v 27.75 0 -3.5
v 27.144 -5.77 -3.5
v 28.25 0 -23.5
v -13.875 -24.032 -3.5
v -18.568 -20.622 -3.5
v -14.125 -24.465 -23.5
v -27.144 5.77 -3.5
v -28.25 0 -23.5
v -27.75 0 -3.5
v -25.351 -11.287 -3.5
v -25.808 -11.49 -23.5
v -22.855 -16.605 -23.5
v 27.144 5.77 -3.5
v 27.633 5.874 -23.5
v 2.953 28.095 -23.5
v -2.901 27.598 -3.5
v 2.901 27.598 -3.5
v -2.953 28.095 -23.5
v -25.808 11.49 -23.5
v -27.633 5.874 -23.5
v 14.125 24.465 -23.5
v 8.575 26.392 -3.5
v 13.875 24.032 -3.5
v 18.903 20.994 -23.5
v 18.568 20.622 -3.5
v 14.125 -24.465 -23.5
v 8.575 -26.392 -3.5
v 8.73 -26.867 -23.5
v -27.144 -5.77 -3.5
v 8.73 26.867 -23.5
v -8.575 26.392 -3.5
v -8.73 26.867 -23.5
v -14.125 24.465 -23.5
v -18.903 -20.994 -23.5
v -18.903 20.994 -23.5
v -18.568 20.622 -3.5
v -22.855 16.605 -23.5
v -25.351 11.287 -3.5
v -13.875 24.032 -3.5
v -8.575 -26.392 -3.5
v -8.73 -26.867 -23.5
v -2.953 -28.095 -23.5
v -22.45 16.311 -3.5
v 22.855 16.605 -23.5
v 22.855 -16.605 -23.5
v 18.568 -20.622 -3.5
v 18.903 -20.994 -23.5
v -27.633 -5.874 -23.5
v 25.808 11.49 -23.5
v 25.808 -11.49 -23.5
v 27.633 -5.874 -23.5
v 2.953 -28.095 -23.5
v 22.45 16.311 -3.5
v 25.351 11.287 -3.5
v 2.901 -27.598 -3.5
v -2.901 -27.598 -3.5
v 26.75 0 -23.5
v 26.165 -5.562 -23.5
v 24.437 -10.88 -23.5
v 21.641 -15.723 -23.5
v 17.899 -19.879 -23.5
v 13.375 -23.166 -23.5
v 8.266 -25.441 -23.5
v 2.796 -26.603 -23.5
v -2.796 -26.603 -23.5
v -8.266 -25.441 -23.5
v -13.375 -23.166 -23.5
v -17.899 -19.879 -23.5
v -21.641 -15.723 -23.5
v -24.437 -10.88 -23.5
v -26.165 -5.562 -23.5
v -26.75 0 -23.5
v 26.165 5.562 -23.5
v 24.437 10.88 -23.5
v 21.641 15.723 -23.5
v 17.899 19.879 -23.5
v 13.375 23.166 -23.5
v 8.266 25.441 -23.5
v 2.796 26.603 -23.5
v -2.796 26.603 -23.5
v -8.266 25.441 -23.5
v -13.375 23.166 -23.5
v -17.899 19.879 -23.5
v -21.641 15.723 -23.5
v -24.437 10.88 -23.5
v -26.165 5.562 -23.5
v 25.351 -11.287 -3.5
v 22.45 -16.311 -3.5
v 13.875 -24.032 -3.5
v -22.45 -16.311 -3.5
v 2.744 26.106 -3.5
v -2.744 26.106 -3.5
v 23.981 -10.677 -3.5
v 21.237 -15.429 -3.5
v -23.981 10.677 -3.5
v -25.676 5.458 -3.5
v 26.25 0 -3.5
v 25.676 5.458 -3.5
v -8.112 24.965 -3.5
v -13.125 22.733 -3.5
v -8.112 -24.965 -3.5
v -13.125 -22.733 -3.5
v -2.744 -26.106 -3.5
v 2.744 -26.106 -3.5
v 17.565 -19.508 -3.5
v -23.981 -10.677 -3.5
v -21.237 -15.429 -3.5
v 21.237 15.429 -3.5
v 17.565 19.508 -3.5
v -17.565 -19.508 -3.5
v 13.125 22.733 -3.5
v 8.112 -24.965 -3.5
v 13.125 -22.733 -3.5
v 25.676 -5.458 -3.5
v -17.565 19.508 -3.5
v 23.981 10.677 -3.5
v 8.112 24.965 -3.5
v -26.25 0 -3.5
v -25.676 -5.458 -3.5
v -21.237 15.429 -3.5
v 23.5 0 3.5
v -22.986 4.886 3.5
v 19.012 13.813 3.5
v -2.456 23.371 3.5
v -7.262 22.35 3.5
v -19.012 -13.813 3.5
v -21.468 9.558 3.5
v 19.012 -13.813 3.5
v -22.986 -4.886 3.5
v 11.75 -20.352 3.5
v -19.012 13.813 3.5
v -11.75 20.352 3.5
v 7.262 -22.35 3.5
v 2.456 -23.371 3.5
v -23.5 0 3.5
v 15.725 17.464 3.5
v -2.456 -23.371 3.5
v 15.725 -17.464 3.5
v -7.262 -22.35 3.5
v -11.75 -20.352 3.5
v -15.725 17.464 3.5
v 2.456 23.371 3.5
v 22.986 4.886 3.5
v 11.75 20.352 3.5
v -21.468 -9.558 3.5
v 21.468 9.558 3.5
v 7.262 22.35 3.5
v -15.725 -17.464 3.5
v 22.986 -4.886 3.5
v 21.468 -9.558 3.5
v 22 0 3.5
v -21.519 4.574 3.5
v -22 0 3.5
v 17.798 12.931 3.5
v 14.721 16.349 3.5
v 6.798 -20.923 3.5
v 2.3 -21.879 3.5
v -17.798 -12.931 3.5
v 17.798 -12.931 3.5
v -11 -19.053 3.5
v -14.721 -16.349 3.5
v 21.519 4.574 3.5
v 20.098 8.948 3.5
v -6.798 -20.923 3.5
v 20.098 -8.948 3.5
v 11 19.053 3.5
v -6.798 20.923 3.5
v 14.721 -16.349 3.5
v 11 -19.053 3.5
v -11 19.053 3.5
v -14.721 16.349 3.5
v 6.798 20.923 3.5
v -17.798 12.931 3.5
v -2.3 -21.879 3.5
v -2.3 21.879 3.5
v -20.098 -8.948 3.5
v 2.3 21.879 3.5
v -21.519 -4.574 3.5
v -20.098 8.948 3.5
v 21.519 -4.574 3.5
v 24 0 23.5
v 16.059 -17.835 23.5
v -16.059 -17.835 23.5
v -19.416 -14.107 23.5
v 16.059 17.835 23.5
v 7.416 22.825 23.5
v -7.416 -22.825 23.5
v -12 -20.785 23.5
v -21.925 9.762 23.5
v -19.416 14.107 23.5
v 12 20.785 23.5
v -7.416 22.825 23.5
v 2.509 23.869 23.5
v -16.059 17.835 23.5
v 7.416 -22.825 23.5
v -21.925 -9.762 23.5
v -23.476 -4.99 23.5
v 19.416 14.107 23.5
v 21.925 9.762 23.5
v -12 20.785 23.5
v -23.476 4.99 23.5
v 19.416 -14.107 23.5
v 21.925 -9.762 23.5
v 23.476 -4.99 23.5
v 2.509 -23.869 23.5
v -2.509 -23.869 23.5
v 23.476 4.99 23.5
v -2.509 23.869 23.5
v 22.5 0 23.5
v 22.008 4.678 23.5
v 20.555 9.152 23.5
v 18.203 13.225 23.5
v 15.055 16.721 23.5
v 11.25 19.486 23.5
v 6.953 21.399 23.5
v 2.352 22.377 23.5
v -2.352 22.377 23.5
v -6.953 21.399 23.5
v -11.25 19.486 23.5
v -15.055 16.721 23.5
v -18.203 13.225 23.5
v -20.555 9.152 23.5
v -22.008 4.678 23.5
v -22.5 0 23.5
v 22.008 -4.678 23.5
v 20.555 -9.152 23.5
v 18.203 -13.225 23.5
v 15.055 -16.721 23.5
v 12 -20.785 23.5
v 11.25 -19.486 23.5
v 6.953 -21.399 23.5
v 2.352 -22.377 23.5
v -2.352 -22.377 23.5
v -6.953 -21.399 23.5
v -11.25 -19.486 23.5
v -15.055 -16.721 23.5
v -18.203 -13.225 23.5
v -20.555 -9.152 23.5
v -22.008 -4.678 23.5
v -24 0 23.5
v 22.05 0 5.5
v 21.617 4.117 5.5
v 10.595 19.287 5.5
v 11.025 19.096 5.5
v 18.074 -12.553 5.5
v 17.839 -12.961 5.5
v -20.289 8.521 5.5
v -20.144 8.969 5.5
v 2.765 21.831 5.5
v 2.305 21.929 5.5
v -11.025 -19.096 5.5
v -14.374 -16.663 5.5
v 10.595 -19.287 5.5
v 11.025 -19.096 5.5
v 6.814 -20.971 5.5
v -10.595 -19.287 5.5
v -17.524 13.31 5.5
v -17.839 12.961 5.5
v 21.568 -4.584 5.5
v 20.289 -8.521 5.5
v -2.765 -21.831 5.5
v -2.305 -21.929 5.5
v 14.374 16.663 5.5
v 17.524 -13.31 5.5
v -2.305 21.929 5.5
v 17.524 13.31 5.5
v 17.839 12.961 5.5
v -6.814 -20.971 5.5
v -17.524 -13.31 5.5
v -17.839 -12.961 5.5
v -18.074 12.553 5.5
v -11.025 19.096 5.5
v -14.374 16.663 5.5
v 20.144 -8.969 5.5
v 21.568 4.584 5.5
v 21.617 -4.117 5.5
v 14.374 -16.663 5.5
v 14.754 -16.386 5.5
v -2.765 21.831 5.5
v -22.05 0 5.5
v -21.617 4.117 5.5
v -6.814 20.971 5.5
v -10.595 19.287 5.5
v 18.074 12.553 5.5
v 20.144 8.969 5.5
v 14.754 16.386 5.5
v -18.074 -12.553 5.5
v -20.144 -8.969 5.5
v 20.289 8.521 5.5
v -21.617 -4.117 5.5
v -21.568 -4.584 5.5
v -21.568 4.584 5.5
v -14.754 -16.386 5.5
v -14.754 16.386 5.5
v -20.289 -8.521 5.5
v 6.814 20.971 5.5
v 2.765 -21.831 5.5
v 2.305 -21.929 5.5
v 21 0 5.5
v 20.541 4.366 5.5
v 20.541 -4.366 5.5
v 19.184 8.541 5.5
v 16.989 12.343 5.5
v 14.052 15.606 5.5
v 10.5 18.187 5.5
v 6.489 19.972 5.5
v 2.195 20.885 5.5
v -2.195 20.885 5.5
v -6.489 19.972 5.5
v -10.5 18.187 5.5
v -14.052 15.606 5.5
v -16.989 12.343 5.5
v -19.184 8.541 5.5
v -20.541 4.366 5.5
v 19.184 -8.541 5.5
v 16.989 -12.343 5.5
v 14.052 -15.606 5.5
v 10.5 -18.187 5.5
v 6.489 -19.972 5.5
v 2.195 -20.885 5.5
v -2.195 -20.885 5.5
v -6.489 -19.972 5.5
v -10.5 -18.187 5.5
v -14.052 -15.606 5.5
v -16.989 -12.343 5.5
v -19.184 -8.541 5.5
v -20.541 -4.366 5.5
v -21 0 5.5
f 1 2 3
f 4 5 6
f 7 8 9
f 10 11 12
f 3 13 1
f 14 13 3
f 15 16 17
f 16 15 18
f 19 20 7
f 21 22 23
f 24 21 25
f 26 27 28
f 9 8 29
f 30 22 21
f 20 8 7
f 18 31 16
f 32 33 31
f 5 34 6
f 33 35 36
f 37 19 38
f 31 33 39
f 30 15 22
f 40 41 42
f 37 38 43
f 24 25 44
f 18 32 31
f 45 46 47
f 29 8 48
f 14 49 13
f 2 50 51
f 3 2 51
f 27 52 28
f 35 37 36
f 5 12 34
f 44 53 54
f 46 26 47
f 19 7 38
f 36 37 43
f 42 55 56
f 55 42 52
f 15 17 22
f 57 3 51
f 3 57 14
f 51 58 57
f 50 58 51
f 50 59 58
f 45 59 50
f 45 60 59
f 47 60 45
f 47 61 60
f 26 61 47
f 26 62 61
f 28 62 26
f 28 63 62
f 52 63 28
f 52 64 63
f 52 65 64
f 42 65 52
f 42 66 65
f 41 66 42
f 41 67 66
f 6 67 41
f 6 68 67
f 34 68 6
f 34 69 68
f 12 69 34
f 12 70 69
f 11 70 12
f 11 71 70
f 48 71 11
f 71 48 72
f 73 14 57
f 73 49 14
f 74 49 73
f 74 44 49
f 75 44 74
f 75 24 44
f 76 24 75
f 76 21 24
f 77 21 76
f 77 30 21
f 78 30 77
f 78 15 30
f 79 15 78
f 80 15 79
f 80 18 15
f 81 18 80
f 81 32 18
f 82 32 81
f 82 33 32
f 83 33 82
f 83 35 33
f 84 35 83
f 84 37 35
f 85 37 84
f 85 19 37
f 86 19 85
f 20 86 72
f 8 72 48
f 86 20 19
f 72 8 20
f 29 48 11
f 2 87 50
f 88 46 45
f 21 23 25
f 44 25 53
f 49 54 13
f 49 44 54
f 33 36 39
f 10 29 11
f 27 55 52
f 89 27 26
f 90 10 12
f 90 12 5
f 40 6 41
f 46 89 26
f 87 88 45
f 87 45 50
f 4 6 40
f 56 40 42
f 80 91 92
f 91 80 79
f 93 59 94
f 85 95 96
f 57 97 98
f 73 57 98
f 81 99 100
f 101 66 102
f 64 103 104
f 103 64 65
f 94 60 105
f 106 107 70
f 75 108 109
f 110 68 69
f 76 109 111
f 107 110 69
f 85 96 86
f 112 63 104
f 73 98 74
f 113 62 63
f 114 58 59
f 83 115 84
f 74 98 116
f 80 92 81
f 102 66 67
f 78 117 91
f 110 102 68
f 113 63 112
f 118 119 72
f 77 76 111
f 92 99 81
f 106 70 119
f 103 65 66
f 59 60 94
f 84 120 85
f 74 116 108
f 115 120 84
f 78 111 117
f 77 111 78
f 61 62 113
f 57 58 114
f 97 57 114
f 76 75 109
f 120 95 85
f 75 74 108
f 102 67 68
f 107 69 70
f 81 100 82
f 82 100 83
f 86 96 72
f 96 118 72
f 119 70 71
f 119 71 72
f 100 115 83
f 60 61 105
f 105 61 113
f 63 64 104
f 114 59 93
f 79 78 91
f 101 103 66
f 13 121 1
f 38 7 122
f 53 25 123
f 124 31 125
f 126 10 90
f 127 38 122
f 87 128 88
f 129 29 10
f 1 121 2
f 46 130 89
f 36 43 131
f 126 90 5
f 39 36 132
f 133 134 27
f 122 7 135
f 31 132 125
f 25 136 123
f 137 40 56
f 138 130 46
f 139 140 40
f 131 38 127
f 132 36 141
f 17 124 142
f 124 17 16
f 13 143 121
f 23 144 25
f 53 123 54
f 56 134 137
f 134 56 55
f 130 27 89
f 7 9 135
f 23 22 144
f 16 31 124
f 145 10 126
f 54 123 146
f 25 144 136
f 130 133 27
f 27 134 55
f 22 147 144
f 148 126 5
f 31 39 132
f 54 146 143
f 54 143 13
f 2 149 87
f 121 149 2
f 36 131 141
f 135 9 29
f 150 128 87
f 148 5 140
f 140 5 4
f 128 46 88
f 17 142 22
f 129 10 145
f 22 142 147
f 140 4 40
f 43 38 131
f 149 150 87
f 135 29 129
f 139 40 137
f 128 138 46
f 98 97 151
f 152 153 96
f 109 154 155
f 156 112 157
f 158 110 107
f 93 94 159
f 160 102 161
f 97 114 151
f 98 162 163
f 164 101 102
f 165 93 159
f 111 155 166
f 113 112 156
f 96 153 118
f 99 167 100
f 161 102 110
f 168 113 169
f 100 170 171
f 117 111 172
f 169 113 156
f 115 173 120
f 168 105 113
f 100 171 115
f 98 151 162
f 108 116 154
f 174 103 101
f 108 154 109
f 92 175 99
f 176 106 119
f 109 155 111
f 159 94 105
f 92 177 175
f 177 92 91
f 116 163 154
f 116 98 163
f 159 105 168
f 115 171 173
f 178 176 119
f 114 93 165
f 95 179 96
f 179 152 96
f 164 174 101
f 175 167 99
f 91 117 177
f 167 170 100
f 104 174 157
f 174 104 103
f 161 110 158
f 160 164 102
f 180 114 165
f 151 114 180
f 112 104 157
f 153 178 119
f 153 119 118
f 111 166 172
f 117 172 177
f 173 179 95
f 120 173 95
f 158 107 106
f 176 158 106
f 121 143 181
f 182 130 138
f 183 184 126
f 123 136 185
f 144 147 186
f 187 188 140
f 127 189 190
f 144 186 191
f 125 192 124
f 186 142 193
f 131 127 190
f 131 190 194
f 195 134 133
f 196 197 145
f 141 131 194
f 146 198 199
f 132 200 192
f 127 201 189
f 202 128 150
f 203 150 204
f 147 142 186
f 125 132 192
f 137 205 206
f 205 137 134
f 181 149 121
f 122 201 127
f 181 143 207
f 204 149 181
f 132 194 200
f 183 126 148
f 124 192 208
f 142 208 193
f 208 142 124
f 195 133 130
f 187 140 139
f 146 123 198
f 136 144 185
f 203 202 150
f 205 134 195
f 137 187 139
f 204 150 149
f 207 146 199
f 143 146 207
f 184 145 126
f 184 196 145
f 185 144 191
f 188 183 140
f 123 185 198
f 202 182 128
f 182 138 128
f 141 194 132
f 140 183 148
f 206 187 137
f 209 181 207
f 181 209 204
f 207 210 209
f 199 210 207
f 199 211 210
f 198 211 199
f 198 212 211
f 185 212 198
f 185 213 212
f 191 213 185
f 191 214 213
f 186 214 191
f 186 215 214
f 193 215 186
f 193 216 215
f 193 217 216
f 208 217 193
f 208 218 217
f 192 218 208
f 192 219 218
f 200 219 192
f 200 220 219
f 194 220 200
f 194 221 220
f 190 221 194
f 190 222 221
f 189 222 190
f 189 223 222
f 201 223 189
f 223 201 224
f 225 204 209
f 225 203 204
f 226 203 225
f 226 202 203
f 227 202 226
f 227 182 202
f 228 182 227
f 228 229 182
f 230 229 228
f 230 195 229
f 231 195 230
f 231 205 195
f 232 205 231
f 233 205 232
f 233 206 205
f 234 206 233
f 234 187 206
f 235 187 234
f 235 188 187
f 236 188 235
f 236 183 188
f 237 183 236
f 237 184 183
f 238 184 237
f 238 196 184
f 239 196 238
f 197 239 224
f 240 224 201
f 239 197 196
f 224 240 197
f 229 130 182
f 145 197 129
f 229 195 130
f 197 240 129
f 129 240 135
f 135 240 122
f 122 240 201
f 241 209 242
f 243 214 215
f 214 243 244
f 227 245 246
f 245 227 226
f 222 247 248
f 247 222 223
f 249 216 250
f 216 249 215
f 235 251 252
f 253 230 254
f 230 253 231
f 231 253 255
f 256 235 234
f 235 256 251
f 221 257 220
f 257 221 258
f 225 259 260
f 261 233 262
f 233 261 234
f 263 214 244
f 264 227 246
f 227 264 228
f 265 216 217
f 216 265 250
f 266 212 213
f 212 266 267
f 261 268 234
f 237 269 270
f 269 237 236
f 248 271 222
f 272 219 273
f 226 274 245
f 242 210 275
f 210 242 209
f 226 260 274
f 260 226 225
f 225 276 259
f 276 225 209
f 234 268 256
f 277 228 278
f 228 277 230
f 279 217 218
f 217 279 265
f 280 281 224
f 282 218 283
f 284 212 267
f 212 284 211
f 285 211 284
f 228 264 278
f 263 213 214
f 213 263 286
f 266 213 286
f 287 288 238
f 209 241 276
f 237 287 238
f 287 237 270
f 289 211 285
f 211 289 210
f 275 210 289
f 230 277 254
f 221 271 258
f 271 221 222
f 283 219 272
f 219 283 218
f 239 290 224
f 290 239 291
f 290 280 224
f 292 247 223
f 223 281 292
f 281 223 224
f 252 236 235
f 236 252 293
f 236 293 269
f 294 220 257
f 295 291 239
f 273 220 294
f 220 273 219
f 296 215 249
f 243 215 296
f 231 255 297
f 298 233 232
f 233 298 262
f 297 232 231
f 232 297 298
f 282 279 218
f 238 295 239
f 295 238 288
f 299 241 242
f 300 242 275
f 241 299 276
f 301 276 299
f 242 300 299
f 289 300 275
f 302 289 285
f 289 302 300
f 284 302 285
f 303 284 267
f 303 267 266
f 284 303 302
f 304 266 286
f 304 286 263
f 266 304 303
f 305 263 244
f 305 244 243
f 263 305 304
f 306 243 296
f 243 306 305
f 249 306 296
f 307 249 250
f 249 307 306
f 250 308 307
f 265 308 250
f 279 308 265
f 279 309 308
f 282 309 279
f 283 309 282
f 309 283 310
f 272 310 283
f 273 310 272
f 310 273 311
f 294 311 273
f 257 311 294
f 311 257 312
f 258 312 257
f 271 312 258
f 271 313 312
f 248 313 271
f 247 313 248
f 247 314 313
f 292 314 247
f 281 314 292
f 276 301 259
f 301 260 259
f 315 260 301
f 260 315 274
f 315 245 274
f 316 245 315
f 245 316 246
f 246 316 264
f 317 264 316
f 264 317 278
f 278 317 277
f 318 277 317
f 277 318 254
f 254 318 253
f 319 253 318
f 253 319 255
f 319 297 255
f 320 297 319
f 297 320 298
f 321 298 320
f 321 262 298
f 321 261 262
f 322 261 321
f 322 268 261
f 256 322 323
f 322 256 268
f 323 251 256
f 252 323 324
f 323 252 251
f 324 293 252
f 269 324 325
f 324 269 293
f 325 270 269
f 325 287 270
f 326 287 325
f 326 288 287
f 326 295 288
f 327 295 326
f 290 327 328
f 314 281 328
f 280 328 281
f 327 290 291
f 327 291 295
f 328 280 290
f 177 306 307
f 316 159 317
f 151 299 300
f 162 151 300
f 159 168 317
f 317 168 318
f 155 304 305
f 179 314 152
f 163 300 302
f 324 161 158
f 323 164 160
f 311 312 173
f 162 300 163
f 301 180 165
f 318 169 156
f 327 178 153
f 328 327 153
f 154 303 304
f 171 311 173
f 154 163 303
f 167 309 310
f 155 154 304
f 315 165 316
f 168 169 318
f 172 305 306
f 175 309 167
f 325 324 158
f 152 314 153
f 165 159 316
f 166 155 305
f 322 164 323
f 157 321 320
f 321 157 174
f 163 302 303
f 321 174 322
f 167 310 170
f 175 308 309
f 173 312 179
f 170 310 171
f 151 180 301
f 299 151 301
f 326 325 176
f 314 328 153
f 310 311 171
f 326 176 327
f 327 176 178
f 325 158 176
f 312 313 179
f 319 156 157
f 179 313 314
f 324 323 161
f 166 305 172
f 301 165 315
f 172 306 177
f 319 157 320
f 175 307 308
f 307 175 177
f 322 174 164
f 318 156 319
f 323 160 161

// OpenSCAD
tolerance = .4;
rVac = 44.2/2 + tolerance;
rPlaner = 52.7/2 + tolerance;
thickness = 1.5;
taper = .5;
hTransition = 7;
hAdapter = 20;

// bottom
translate([0,0,-(hAdapter+hTransition)/2]) {
    difference() {
        cylinder(h = hAdapter, r1 = rPlaner+thickness, r2 = rPlaner+thickness-taper, center = true);
        cylinder(h = hAdapter, r1 = rPlaner, r2 = rPlaner-taper, center = true);
    };
}

// transition
difference() {
    cylinder(h = hTransition, r1 = rPlaner+thickness-taper, r2 = rVac+thickness-taper, center = true);
    cylinder(h = hTransition, r1 = rPlaner-taper, r2 = rVac-taper, center = true);
};

// top
translate([0,0,(hAdapter+hTransition)/2]) {
    difference() {
        cylinder(h = hAdapter, r1 = rVac+thickness-taper, r2 = rVac+thickness, center = true);
        cylinder(h = hAdapter, r1 = rVac-taper, r2 = rVac, center = true);
    };
}
// stop ring
translate([0,0,hTransition/2+1]) {
    difference() {
        cylinder(h = 2, r1 = rVac+thickness-taper, r2 = rVac+thickness-taper, center = true);
        cylinder(h = 2, r1 = rVac-taper, r2 = rVac-taper-1, center = true);
    };
}
